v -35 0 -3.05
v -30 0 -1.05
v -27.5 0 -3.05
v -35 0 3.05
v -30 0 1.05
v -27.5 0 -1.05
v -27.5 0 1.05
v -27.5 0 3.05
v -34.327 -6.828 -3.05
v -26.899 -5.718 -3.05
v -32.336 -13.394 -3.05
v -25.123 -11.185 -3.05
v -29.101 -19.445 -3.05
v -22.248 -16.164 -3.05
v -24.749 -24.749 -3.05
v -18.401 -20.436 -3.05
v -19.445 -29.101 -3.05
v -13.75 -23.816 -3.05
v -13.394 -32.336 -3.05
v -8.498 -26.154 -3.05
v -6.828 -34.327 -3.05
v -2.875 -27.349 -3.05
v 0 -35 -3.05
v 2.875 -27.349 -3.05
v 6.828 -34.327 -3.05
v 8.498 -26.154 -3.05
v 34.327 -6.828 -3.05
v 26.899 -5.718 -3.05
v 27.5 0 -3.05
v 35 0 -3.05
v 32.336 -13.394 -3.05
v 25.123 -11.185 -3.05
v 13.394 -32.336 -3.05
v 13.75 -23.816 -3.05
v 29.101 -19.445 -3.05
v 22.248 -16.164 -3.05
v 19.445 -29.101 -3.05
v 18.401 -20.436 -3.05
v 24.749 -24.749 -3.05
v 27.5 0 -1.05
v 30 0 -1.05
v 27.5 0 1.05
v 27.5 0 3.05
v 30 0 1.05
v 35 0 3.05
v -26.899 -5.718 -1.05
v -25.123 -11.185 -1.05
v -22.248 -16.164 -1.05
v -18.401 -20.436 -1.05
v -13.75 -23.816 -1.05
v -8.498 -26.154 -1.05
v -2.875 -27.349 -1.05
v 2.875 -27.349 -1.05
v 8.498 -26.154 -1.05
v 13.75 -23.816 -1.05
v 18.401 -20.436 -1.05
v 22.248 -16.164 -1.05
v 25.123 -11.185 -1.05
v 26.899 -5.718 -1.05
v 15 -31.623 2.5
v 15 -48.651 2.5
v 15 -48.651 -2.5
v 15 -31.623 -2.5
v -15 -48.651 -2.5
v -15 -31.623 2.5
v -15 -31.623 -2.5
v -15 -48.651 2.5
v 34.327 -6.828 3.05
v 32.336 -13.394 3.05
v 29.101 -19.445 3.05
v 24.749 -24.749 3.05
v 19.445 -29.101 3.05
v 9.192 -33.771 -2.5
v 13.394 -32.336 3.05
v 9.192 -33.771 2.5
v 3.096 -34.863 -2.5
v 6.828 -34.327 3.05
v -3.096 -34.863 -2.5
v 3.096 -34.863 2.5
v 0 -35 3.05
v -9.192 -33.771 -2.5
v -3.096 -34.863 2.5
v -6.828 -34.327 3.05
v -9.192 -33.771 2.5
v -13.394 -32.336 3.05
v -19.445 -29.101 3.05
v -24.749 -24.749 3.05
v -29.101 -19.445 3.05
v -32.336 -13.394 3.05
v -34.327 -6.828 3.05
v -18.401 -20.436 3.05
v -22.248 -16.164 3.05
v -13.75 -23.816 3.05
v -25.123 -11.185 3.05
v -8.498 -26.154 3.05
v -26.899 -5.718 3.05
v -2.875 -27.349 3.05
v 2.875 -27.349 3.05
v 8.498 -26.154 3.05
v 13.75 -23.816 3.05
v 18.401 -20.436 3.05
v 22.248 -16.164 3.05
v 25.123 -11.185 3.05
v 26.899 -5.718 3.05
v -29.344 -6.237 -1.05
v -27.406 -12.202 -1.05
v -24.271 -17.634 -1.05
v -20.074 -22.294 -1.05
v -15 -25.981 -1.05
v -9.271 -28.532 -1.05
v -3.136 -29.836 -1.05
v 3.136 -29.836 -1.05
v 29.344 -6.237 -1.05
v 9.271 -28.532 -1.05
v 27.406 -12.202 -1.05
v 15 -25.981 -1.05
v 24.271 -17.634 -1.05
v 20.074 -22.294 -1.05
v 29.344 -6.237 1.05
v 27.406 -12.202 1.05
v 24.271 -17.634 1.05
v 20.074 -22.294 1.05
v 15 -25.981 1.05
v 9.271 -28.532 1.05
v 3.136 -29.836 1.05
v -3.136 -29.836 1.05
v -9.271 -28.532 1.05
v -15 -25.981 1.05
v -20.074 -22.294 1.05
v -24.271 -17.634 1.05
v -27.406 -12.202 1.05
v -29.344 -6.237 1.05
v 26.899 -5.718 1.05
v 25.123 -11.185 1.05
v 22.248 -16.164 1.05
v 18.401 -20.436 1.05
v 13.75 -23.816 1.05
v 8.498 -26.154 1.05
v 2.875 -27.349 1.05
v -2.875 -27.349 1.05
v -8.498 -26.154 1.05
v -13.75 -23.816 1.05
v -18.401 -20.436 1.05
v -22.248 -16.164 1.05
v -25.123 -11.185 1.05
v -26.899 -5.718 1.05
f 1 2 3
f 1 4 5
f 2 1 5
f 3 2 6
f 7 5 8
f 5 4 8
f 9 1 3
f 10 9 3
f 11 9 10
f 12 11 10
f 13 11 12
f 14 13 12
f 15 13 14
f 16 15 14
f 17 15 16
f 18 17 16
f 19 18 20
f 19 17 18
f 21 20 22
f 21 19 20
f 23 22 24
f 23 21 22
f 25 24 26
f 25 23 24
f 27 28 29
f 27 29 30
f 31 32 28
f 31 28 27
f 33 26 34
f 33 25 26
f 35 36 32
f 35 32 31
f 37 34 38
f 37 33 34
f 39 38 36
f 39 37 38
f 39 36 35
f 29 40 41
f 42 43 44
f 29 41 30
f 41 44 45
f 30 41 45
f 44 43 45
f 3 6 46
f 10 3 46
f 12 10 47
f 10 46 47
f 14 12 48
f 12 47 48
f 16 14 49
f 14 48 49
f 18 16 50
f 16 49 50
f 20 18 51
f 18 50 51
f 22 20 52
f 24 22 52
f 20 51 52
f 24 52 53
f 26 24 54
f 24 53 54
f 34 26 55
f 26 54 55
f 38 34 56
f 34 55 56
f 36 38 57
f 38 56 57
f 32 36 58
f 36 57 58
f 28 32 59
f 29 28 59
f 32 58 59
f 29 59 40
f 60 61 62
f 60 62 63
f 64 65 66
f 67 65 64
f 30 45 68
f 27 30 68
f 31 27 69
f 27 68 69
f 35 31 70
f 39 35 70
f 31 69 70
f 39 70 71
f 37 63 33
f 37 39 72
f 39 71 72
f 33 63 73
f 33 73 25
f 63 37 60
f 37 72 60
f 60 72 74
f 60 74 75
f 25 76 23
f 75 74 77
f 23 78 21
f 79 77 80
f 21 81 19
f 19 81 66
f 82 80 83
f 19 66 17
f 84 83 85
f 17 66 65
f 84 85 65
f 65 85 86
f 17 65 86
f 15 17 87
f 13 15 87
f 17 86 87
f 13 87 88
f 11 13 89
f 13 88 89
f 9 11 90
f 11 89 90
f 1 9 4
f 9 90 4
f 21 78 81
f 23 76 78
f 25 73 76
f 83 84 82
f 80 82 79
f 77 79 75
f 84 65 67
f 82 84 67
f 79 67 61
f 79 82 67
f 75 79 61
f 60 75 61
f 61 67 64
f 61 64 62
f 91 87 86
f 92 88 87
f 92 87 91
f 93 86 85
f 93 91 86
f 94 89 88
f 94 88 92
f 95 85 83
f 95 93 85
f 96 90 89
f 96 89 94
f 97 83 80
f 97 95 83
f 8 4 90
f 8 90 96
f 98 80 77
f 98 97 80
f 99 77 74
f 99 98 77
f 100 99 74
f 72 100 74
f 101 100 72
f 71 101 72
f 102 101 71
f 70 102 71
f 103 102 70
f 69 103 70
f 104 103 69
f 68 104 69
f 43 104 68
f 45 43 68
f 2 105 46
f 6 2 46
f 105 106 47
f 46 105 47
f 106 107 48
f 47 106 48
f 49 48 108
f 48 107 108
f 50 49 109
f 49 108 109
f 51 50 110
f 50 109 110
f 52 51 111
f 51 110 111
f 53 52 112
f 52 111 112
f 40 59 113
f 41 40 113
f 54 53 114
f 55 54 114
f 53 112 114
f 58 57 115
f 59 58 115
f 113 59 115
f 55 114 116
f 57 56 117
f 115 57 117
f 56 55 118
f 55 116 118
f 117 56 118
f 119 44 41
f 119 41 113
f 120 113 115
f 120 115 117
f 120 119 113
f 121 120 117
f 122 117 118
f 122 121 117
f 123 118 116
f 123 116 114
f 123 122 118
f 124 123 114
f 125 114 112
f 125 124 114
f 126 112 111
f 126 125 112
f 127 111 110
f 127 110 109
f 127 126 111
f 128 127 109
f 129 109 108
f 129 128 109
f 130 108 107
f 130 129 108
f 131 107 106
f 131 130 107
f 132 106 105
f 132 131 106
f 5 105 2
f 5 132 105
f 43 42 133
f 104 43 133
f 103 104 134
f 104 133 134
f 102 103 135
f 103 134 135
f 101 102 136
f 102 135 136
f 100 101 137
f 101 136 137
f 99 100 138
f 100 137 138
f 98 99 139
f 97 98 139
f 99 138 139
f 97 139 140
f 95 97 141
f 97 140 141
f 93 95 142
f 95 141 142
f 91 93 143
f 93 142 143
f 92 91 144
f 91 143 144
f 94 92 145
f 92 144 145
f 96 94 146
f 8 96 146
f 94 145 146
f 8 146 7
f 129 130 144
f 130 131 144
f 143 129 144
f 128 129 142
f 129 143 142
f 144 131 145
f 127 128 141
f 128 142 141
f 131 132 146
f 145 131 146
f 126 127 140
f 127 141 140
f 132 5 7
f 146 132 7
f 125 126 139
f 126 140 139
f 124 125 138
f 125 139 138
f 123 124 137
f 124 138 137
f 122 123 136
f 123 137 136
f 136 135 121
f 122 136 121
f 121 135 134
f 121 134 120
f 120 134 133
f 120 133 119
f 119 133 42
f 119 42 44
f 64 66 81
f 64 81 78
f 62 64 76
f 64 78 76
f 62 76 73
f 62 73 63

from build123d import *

# Parameters (mm, degrees)
F1_DEPTH = 1.05
F3_DEPTH = 2
F5_DEPTH = 2
F7_DEPTH = 2.5


with BuildPart() as f1:
    # F0 (on Top) → F1 (new body, symmetric)
    with BuildSketch(Plane.XY):
        with BuildLine():
            Line((35, 0), (30, 0))
            ThreePointArc((30, 0), (0, -30), (-30, 0))
            Line((-30, 0), (-35, 0))
            ThreePointArc((-35, 0), (0, -35), (35, 0))
        make_face()
    extrude(amount=F1_DEPTH, both=True)

    # F2 (on face) → F3 (join)
    with BuildSketch(Plane.XY.offset(1.05)):
        with BuildLine():
            ThreePointArc((-30, 0), (0, -30), (30, 0))
            Line((30, 0), (27.5, 0))
            ThreePointArc((27.5, 0), (0, -27.5), (-27.5, 0))
            Line((-27.5, 0), (-30, 0))
        make_face()
        with BuildLine():
            ThreePointArc((-35, 0), (0, -35), (35, 0))
            Line((35, 0), (30, 0))
            ThreePointArc((30, 0), (0, -30), (-30, 0))
            Line((-30, 0), (-35, 0))
        make_face()
    extrude(amount=F3_DEPTH)

    # F4 (on face) → F5 (join)
    with BuildSketch(Plane(origin=(0, 0, -1.05), x_dir=(1, 0, 0), z_dir=(0, 0, -1))):
        with BuildLine():
            Line((30, 0), (35, 0))
            ThreePointArc((35, 0), (0, 35), (-35, 0))
            Line((-35, 0), (-30, 0))
            ThreePointArc((-30, 0), (0, 30), (30, 0))
        make_face()
        with BuildLine():
            Line((27.5, 0), (30, 0))
            ThreePointArc((30, 0), (0, 30), (-30, 0))
            Line((-30, 0), (-27.5, 0))
            ThreePointArc((-27.5, 0), (0, 27.5), (27.5, 0))
        make_face()
    extrude(amount=F5_DEPTH)

    # F6 (on Top) → F7 (join, symmetric)
    with BuildSketch(Plane.XY):
        with BuildLine():
            Line((0, -48.6514897645), (0, -33.6514897645))
            ThreePointArc((0, -33.6514897645), (-7.624504365, -32.7740115893), (-15, -30.6514897645))
            Line((-15, -30.6514897645), (-15, -48.6514897645))
            Line((-15, -48.6514897645), (0, -48.6514897645))
        make_face()
        with BuildLine():
            ThreePointArc((15, -30.6514897645), (7.624504365, -32.7740115893), (0, -33.6514897645))
            Line((0, -33.6514897645), (0, -48.6514897645))
            Line((0, -48.6514897645), (15, -48.6514897645))
            Line((15, -48.6514897645), (15, -30.6514897645))
        make_face()
    extrude(amount=F7_DEPTH, both=True)


solid = f1.part
